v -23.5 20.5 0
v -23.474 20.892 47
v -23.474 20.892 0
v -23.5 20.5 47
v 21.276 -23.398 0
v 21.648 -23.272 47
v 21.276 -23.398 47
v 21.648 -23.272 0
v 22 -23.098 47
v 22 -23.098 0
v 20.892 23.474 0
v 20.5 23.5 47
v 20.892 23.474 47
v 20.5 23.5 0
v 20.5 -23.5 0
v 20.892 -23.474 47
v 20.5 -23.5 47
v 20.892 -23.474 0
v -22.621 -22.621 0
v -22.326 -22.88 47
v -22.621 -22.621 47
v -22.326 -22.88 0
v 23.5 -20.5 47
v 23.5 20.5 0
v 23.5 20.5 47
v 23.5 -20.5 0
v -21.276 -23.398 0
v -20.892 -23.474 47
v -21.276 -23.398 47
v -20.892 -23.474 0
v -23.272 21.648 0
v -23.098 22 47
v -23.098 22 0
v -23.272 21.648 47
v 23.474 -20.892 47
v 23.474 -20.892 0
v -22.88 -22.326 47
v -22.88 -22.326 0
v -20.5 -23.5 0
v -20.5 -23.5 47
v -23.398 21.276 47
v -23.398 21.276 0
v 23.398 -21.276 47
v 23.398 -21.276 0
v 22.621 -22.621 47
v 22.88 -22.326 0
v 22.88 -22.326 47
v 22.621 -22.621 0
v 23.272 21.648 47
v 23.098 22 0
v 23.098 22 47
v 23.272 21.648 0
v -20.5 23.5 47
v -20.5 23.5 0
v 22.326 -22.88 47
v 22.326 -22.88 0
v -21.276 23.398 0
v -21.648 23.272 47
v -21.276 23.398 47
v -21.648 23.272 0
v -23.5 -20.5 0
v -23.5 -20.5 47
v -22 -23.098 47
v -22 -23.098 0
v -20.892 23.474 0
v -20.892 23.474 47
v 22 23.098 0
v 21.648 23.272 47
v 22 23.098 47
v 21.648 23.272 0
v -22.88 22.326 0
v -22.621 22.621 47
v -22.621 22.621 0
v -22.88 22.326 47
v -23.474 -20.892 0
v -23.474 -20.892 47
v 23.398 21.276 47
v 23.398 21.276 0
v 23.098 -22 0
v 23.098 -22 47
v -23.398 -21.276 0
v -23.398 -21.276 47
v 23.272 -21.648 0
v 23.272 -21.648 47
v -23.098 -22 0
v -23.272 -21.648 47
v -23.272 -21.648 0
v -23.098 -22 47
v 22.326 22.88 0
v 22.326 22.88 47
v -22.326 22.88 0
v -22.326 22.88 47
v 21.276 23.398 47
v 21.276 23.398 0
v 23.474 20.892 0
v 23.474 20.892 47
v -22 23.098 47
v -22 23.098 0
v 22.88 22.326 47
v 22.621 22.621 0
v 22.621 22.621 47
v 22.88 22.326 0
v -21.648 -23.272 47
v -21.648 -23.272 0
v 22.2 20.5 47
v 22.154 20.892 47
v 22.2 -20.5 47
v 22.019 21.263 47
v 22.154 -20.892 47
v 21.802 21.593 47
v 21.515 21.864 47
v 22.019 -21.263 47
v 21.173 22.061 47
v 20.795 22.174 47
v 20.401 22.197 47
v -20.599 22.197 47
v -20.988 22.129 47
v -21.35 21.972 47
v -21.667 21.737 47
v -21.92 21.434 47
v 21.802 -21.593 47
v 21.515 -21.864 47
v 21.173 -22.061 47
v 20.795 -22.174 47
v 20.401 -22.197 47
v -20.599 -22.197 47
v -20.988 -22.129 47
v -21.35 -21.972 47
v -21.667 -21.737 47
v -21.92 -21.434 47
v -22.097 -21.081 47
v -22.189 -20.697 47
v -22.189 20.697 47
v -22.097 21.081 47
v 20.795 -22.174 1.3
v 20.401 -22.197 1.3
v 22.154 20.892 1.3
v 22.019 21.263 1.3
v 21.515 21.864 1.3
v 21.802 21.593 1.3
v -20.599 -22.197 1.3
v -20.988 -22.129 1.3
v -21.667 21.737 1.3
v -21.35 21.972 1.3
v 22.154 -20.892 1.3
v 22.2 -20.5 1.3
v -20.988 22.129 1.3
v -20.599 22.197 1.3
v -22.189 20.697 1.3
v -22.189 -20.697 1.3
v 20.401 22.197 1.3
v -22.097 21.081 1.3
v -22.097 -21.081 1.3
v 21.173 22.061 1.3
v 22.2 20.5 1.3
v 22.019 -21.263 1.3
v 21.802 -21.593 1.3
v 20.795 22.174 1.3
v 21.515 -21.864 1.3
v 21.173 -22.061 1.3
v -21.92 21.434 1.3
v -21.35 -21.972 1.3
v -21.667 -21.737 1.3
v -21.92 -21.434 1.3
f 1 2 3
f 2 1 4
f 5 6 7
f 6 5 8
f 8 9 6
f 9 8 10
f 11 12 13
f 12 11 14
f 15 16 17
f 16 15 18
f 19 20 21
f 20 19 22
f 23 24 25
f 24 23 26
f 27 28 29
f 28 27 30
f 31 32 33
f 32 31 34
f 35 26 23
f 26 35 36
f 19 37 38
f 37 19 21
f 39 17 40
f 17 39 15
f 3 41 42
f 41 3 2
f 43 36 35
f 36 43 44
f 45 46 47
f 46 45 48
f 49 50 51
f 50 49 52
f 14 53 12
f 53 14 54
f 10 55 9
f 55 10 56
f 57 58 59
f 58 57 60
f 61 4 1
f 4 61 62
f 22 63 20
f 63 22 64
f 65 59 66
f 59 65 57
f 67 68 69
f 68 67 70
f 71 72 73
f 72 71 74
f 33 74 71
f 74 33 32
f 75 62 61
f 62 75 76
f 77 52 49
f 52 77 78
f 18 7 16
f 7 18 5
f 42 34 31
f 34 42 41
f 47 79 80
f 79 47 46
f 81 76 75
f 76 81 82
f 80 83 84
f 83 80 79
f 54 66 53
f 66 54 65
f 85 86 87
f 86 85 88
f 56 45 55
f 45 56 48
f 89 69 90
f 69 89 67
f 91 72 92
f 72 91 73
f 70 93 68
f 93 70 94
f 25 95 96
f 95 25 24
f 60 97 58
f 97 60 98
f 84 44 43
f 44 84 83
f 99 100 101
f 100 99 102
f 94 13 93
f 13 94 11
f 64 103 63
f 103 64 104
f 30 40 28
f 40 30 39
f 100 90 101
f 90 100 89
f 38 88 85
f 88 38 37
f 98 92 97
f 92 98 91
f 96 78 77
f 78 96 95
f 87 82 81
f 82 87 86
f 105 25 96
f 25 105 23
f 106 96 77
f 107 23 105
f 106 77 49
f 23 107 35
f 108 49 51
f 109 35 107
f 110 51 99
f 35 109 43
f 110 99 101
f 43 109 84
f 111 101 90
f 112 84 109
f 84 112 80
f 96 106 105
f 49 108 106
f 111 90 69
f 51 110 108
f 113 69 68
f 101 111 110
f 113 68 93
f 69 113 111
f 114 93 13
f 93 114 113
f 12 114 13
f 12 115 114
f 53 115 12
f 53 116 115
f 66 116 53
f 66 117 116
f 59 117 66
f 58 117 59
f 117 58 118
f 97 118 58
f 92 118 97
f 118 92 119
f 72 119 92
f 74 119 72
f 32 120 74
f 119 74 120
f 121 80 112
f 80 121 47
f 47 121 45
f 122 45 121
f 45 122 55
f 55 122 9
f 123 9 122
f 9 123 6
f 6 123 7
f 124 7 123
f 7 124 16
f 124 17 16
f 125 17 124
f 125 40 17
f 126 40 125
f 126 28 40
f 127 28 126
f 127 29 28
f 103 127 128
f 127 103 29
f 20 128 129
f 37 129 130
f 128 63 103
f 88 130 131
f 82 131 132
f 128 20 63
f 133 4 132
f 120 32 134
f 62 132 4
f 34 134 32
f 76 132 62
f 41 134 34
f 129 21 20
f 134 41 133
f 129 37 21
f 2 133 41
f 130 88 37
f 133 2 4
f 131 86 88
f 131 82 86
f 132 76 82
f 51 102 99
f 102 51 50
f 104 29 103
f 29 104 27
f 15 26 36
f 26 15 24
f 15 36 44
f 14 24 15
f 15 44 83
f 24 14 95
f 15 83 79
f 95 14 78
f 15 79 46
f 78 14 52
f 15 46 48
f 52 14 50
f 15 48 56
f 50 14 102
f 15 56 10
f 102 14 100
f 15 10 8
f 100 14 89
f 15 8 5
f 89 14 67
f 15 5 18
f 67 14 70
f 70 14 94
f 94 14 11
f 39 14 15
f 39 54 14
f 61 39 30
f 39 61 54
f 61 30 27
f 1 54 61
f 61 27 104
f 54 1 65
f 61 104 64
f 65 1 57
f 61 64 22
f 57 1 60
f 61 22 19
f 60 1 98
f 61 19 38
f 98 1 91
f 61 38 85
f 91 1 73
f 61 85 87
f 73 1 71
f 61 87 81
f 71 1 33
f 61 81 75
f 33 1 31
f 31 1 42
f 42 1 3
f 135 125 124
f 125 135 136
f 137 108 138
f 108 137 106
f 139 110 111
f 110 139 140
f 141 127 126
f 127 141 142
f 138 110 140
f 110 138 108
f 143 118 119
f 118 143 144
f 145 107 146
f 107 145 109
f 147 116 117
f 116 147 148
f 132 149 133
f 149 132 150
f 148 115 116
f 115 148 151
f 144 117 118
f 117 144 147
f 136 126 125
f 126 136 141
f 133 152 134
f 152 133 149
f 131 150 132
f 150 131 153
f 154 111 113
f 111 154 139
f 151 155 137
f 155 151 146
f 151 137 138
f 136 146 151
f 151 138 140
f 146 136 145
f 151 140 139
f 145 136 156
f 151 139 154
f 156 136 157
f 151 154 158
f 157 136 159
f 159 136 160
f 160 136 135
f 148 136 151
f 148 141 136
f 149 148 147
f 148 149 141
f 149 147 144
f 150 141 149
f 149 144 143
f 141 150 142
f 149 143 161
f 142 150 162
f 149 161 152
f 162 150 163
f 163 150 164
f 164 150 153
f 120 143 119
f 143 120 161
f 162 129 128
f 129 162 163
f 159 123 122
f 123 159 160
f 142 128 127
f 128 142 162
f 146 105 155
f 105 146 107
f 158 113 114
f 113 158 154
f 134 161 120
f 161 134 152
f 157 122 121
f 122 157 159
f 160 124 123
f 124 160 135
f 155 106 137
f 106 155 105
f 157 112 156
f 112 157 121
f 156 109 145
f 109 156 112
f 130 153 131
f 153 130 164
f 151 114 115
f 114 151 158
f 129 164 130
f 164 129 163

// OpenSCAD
use <mylib.scad>;
p = .001;
pp = 2 * p;
t0 = 1;
module dice(tr=[0,0,0], ds = ds) {
  color("#DDDDDD")
  translate(tr) roundedCube([ds,ds,ds], 2, false);
}

module cup(t = t0) {
  // roundedRect fustrum:
  // vt: offset of base & walls (thickness)
  module vcup(base_xyc, top_xyz, vt = 0) {
    bx = base_xyc[0] - 2*vt;
    by = base_xyc[1] - 2*vt;
    rc = base_xyc[2] - vt;
    bxy = [bx, by];
    scal = [(top_xyz[0] - 2*vt)/bx, (top_xyz[1] - 2*vt)/by];
    trr([0, 0, vt])
    linear_extrude(height = top_xyz[2], scale = scal) 
    trr([-bx/2, -by/2, 0]) roundedRect(bxy, rc);
  }

  rc = 3;
  dz = 47;
  dx0 = 47;
  dy0 = 47;
  dx1 = 47;
  dy1 = 47;
  vt = 1.3;

intersection() 
{
  // cup:
  difference() {
    vcup([dx0, dy0, rc], [dx1, dy1, dz], 0);
    vcup([dx0, dy0, rc], [dx1, dy1, dz], vt);
  }
  cube(size=[dx1+2*vt, dy1+2*vt, 169], center = true);
}
}

// dice size
ds = 16;
// robber size
rs = 15;

// astack(2, [-ds*1.1, 0, 0]) trr([0, -ds/2, t0]) dice();
cup();
